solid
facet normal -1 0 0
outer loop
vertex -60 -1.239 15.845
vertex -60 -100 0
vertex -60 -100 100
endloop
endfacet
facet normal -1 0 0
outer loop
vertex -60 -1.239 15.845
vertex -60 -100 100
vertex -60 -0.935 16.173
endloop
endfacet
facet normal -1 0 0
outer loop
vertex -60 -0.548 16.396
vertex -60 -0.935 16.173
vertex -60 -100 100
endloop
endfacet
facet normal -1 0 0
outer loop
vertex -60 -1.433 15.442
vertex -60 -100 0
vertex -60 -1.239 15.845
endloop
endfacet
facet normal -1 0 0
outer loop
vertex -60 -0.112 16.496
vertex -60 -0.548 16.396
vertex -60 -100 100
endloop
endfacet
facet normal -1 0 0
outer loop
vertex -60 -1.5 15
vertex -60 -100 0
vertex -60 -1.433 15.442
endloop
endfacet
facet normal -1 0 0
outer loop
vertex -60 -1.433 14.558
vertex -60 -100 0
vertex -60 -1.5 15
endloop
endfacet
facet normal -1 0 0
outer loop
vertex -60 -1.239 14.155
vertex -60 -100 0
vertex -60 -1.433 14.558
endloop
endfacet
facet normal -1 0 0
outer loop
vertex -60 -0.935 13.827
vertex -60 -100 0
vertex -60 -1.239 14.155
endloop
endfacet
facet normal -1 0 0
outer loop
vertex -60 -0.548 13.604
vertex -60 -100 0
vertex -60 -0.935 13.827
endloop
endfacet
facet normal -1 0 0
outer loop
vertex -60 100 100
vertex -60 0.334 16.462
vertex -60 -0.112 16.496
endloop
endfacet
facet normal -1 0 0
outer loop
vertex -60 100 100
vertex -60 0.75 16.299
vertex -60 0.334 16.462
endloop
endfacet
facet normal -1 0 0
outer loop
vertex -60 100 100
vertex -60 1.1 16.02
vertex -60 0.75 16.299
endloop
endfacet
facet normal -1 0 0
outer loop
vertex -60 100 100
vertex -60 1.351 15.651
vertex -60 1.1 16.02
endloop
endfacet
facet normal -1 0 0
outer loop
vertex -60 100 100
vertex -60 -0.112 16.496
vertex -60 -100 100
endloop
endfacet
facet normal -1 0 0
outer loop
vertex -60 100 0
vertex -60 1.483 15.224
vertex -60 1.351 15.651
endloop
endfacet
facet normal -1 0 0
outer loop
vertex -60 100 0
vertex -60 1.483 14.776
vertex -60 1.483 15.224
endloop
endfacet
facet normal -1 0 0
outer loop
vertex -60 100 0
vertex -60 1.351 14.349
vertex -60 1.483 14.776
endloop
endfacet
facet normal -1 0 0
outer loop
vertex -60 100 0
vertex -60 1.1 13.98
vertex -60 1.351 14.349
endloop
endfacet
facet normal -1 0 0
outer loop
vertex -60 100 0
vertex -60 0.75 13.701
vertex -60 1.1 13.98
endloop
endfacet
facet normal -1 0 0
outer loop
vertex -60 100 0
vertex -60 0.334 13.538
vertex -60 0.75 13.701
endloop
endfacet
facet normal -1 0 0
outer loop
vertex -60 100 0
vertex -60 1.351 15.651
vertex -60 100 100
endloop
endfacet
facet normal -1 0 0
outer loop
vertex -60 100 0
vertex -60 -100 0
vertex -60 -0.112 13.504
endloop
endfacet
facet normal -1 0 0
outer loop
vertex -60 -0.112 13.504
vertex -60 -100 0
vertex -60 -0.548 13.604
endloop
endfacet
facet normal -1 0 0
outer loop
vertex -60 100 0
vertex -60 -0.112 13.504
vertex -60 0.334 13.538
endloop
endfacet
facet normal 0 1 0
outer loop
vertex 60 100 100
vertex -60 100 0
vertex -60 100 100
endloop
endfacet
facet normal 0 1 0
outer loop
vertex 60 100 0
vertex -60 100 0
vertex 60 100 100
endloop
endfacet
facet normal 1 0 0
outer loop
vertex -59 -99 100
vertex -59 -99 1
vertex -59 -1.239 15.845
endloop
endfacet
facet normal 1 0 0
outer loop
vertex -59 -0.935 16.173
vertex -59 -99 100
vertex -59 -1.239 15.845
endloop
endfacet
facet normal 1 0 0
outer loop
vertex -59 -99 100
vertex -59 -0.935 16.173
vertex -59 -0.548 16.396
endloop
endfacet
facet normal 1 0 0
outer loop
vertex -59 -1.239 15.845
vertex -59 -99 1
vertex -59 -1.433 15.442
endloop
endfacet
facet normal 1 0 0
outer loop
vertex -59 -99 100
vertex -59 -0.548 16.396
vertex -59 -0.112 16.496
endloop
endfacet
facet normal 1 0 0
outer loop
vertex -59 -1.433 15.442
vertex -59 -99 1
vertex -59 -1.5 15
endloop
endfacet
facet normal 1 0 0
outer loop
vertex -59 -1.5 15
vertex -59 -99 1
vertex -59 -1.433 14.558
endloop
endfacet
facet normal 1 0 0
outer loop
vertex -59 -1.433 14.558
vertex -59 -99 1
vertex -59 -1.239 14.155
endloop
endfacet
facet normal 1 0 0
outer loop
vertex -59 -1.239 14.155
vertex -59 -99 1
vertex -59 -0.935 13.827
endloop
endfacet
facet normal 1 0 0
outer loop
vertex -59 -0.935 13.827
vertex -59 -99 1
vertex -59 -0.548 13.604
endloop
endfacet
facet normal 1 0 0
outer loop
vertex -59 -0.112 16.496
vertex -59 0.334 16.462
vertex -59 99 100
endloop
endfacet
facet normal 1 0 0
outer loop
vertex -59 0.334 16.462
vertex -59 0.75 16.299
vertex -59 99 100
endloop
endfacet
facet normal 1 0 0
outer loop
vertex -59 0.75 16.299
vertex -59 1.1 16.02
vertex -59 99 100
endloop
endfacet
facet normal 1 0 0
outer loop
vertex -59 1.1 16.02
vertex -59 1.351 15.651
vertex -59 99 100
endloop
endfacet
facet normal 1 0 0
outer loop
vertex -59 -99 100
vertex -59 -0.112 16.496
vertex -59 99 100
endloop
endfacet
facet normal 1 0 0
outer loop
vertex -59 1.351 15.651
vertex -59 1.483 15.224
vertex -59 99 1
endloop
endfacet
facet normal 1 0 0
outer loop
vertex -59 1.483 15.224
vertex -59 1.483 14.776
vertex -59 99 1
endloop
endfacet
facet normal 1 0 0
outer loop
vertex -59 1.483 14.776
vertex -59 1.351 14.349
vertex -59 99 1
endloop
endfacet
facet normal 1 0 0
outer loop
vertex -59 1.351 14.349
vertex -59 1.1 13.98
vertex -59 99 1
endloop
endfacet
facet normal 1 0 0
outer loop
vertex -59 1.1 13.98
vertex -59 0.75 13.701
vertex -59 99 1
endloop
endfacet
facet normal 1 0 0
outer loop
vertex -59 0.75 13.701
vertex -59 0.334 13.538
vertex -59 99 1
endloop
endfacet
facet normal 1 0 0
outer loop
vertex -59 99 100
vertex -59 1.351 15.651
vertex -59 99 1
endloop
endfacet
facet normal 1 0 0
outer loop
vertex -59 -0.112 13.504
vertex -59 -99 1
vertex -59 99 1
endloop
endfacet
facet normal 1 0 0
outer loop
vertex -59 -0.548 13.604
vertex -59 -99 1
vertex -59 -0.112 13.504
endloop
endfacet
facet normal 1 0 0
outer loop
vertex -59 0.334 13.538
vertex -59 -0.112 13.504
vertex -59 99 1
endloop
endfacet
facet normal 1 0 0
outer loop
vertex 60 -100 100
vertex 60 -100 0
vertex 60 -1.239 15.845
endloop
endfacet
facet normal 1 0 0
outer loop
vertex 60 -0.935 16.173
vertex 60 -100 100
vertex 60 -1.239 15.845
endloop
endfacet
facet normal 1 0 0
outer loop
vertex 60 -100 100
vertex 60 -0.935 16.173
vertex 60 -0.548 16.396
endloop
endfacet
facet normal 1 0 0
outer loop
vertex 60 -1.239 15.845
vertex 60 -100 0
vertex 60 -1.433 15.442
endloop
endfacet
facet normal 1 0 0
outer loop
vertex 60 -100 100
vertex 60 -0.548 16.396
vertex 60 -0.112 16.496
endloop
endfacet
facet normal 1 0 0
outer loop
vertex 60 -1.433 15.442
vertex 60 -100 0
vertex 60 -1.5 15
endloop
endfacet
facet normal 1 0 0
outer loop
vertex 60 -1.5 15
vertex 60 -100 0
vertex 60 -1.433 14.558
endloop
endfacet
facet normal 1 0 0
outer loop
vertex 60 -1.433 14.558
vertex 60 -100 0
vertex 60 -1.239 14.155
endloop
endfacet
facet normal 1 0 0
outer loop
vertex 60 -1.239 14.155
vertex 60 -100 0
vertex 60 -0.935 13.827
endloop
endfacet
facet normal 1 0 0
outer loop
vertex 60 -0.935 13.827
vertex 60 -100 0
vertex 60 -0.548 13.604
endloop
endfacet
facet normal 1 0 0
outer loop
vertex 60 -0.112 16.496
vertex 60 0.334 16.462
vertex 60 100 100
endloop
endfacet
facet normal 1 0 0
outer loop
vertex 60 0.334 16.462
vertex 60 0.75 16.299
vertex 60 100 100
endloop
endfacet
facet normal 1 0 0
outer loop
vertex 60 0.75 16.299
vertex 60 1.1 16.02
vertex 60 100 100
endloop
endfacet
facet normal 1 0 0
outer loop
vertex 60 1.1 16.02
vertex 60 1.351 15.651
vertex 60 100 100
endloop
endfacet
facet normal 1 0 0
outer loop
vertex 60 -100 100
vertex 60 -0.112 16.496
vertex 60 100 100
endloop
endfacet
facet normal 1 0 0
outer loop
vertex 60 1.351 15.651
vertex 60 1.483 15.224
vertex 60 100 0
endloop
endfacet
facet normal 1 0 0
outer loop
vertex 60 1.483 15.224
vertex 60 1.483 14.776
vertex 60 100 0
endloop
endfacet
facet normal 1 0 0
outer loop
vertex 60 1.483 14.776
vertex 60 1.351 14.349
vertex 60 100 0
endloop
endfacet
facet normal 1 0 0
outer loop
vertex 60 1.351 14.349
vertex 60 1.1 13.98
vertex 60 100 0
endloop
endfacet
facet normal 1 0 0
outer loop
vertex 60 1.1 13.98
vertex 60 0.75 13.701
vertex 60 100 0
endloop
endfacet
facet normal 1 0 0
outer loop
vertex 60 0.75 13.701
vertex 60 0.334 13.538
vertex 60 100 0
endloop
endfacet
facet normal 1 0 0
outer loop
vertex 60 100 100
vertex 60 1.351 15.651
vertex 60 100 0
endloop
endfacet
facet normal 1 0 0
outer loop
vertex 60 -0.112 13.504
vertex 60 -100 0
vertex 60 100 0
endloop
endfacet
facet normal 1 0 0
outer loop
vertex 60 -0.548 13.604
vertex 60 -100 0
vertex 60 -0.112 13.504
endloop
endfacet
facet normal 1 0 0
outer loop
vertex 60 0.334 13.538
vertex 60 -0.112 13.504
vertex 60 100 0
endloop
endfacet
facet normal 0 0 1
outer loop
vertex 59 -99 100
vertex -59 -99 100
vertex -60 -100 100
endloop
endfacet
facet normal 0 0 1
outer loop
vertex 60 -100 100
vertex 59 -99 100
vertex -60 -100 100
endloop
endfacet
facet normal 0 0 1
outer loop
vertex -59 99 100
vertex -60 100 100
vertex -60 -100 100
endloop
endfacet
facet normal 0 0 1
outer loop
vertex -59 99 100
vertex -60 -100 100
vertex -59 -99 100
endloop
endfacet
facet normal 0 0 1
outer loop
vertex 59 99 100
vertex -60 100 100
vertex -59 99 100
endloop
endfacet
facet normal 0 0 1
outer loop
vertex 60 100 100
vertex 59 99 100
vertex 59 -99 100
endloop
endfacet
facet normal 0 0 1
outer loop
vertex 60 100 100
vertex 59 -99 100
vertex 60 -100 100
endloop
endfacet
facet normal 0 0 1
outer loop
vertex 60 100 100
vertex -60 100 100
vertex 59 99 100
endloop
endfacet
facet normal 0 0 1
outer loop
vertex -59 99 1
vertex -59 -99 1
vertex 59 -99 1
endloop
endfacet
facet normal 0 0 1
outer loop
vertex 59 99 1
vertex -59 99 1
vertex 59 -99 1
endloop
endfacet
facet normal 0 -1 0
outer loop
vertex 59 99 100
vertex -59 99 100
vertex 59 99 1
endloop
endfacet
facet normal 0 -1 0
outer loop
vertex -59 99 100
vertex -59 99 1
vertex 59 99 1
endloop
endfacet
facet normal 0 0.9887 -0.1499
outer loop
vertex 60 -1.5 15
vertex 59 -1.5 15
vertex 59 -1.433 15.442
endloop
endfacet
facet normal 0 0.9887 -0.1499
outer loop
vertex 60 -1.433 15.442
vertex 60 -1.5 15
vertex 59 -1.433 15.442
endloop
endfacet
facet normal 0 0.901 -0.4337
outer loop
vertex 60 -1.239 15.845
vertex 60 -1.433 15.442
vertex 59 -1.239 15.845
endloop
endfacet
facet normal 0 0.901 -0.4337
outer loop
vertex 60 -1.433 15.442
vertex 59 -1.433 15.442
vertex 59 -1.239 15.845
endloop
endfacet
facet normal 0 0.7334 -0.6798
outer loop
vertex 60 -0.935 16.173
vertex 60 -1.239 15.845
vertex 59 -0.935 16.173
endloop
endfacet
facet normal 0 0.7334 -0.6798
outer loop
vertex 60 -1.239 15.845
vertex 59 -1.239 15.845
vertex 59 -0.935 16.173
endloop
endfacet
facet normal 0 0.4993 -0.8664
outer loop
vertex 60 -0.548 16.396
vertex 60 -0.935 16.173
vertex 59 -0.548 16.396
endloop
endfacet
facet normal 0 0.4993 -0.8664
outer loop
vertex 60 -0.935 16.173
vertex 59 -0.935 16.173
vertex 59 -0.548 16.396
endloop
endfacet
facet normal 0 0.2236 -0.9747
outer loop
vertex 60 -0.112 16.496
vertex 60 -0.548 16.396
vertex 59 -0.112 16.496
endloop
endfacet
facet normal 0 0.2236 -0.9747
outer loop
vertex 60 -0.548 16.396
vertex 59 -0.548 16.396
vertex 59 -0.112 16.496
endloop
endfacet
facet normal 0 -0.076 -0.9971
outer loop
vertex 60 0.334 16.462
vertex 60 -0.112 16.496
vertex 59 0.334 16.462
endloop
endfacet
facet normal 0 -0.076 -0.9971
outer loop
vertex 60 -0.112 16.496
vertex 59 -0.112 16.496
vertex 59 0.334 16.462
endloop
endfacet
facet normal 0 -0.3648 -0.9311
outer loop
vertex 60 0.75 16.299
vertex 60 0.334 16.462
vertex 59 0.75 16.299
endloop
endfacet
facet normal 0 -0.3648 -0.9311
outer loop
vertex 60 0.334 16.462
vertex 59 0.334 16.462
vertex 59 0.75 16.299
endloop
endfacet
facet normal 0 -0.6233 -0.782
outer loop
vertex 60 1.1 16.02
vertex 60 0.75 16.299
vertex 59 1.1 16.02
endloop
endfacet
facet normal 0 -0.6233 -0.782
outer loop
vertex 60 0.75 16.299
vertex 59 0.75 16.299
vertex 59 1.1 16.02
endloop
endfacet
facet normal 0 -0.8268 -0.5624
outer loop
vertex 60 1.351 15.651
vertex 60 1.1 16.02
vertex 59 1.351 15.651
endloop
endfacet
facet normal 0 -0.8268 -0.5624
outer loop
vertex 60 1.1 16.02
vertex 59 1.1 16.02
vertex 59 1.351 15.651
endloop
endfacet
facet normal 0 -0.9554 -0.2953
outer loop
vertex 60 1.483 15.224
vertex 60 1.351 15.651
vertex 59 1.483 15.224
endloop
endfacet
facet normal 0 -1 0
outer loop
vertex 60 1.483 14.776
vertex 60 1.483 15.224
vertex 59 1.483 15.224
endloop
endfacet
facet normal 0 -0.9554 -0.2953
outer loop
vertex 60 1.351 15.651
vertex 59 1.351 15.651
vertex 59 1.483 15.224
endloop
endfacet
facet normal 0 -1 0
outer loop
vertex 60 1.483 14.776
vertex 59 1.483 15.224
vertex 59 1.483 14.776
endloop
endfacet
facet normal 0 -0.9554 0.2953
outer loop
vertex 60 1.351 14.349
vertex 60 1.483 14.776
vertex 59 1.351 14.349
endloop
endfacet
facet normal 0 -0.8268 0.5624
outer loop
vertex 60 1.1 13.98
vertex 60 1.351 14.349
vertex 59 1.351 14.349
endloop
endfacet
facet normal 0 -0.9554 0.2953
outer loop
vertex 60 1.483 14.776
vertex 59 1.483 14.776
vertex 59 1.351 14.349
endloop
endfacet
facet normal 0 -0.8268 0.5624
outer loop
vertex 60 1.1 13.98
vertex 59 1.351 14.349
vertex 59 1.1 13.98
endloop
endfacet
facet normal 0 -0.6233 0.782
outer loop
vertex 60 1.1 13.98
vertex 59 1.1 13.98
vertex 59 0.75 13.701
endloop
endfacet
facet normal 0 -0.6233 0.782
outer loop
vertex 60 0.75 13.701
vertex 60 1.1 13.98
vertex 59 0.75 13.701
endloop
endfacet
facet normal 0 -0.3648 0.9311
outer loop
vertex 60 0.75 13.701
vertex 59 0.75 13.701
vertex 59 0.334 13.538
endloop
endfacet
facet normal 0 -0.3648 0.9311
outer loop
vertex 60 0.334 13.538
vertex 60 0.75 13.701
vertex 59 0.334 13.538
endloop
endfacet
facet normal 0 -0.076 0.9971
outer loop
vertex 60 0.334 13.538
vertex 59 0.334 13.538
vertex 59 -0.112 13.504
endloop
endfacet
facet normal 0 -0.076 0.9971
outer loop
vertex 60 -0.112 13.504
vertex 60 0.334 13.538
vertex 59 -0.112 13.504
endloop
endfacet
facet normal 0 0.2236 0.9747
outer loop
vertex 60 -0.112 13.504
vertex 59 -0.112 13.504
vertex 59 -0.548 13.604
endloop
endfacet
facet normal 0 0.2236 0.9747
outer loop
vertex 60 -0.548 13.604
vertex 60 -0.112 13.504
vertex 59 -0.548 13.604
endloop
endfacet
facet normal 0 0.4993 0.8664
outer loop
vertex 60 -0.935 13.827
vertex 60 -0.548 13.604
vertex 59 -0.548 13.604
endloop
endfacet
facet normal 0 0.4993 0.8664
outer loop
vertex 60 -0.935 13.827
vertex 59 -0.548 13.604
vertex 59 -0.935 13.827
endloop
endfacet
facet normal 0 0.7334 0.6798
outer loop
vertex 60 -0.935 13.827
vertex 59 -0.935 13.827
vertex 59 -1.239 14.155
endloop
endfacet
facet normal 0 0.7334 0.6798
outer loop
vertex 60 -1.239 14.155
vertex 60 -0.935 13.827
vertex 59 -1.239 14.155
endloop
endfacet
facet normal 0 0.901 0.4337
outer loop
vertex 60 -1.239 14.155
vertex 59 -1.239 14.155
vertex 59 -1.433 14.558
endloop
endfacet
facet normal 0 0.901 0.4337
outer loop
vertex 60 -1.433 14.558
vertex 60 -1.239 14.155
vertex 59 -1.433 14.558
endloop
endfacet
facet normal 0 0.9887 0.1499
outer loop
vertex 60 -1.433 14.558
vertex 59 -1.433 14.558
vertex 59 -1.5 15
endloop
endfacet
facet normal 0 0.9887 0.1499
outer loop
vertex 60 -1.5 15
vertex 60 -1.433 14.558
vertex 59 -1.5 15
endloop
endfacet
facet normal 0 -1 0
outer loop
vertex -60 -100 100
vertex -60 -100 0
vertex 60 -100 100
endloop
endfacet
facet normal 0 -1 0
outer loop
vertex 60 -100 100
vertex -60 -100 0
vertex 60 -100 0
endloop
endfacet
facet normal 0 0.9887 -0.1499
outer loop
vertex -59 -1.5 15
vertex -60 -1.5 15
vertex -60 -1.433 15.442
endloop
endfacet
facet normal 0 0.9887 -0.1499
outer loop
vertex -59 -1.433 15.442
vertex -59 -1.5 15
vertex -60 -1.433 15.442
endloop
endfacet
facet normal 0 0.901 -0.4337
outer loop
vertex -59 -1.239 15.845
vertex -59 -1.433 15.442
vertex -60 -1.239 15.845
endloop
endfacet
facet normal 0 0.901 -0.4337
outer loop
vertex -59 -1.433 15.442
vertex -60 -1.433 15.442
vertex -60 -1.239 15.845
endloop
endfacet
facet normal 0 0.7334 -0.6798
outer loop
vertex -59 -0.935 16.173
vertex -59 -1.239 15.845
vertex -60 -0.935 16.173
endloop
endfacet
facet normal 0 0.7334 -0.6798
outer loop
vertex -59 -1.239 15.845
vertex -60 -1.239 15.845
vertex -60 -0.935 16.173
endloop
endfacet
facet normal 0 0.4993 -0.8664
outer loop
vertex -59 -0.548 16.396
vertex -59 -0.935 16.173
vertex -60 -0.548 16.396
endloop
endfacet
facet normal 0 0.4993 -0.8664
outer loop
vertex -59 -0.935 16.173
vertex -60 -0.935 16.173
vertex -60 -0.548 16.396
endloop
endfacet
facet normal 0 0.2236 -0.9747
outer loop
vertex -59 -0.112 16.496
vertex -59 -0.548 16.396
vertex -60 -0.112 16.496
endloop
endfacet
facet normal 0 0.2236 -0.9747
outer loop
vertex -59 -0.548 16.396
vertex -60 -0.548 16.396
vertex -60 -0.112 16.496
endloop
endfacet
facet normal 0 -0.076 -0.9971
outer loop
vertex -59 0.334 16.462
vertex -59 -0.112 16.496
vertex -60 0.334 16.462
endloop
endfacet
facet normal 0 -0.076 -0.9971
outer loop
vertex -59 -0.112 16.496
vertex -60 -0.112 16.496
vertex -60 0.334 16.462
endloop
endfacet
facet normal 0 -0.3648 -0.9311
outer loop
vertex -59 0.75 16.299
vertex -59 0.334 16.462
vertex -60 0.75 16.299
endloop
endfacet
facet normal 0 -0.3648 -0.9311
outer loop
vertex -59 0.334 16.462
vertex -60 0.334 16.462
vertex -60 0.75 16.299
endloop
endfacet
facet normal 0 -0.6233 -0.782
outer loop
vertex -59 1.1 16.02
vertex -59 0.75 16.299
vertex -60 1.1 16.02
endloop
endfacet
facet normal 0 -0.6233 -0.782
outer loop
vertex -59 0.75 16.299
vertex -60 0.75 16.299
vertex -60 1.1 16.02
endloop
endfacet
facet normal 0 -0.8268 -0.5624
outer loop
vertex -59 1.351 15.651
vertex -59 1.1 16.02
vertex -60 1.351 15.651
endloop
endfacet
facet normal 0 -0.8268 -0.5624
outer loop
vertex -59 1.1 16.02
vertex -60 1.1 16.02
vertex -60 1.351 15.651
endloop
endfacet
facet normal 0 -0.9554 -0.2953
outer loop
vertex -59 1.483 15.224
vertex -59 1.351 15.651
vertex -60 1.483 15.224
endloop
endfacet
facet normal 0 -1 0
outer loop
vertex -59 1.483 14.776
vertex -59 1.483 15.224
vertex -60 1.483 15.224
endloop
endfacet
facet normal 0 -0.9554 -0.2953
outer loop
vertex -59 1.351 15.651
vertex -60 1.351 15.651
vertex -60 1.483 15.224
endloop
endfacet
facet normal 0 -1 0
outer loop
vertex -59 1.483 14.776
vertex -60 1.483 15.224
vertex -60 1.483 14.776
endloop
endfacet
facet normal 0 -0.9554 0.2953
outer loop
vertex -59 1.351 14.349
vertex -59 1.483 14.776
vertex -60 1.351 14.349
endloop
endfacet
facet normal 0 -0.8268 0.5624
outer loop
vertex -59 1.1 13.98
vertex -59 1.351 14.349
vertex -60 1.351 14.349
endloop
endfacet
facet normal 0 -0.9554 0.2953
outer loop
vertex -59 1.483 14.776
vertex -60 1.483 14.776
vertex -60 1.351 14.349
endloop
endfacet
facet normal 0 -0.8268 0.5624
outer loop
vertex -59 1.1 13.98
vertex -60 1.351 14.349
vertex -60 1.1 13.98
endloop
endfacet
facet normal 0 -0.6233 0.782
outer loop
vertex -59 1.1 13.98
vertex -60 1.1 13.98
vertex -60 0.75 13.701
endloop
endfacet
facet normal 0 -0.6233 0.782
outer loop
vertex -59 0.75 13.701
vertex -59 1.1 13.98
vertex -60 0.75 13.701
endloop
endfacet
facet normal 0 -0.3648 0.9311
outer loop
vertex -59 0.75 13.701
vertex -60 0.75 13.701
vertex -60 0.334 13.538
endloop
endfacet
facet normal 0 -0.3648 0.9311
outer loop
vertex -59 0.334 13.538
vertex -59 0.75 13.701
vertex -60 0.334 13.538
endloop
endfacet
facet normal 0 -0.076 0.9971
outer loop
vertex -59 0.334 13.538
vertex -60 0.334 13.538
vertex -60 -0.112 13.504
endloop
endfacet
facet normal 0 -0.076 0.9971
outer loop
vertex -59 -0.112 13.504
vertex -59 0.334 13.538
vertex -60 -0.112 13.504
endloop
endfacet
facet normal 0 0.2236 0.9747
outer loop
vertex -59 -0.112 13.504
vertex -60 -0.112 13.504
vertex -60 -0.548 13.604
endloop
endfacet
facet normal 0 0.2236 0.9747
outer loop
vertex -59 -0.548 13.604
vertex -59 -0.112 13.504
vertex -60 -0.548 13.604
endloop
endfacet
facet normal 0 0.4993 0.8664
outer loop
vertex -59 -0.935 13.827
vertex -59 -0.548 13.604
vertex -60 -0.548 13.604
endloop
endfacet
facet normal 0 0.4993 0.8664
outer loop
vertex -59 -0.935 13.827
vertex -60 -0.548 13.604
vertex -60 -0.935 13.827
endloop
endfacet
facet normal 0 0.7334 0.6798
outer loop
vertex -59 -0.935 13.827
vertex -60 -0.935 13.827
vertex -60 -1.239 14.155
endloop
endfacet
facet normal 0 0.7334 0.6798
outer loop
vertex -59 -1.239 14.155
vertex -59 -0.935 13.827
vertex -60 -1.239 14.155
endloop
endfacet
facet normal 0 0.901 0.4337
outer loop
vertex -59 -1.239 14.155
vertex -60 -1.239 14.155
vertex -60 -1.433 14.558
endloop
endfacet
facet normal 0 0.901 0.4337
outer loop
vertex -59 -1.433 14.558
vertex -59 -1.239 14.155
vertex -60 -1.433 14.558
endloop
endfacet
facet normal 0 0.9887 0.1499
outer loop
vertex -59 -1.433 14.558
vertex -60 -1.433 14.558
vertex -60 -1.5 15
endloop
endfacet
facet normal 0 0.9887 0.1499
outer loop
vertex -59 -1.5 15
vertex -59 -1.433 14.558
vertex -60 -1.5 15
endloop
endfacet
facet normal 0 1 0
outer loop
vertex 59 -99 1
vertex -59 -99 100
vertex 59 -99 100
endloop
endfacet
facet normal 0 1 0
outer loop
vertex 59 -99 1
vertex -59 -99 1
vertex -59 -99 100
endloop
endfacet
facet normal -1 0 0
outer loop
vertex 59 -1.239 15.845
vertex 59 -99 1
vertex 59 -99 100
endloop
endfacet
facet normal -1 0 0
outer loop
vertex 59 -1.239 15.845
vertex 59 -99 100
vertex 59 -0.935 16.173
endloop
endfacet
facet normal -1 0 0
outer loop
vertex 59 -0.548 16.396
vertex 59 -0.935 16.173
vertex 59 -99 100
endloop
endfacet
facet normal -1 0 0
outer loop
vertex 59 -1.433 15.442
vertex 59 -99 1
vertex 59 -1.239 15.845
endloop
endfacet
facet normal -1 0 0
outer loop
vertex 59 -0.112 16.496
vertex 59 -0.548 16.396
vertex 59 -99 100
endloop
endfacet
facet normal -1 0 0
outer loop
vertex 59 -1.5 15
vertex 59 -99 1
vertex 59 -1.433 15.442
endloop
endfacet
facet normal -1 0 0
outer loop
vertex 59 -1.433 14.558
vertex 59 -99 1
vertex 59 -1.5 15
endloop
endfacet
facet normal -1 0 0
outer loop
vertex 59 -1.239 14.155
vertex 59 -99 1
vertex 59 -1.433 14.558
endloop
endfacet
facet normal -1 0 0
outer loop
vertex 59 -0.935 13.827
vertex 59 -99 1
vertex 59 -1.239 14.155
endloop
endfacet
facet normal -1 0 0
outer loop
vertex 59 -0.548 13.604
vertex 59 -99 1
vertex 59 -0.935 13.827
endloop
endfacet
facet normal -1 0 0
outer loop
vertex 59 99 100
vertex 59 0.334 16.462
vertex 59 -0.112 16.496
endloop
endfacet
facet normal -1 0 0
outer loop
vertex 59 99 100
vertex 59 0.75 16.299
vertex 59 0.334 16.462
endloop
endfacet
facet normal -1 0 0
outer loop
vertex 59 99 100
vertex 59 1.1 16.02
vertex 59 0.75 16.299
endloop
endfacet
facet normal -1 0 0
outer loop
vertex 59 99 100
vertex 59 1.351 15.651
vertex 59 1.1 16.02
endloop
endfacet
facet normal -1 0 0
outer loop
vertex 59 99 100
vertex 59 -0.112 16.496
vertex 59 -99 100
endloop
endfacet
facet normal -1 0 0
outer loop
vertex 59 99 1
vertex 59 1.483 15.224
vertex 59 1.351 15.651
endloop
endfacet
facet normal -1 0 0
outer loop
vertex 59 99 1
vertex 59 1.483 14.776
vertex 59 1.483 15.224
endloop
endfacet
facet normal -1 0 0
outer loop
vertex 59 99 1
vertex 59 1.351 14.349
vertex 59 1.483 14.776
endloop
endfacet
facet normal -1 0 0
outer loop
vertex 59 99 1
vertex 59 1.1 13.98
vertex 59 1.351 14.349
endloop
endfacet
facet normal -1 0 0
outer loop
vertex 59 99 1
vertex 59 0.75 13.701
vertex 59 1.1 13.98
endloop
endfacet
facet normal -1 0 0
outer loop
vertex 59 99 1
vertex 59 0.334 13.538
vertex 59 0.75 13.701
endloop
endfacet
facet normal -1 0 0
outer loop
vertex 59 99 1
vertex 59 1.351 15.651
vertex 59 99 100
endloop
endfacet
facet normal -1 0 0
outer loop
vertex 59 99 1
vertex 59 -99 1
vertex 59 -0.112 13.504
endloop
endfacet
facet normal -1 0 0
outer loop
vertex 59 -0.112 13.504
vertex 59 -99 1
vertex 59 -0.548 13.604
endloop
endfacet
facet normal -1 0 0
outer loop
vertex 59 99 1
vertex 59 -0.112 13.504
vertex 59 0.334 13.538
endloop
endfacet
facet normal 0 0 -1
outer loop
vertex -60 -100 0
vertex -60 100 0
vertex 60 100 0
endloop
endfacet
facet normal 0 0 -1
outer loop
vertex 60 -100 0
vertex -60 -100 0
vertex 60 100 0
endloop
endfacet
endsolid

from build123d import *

# Parameters (mm, degrees)
F0_W     = 120
F0_H     = 200
F1_DEPTH = 100
F2_T     = -1
F3_R     = 1.5
F4_DEPTH = 130


with BuildPart() as f1:
    # F0 (on Top) → F1 (new body)
    with BuildSketch(Plane.XY):
        Rectangle(F0_W, F0_H)
    extrude(amount=F1_DEPTH)

    # F2
    f2_openings = [f1.faces().sort_by_distance(p)[0] for p in [
        (0, 0, 100),
    ]]
    offset(amount=F2_T, openings=f2_openings)

    # F3 (on face) → F4 (cut)
    with BuildSketch(Plane(origin=(-60, 0, 0), x_dir=(0, -1, 0), z_dir=(-1, 0, 0))):
        with Locations((0, 15)):
            Circle(F3_R)
    extrude(amount=-F4_DEPTH, mode=Mode.SUBTRACT)


solid = f1.part
